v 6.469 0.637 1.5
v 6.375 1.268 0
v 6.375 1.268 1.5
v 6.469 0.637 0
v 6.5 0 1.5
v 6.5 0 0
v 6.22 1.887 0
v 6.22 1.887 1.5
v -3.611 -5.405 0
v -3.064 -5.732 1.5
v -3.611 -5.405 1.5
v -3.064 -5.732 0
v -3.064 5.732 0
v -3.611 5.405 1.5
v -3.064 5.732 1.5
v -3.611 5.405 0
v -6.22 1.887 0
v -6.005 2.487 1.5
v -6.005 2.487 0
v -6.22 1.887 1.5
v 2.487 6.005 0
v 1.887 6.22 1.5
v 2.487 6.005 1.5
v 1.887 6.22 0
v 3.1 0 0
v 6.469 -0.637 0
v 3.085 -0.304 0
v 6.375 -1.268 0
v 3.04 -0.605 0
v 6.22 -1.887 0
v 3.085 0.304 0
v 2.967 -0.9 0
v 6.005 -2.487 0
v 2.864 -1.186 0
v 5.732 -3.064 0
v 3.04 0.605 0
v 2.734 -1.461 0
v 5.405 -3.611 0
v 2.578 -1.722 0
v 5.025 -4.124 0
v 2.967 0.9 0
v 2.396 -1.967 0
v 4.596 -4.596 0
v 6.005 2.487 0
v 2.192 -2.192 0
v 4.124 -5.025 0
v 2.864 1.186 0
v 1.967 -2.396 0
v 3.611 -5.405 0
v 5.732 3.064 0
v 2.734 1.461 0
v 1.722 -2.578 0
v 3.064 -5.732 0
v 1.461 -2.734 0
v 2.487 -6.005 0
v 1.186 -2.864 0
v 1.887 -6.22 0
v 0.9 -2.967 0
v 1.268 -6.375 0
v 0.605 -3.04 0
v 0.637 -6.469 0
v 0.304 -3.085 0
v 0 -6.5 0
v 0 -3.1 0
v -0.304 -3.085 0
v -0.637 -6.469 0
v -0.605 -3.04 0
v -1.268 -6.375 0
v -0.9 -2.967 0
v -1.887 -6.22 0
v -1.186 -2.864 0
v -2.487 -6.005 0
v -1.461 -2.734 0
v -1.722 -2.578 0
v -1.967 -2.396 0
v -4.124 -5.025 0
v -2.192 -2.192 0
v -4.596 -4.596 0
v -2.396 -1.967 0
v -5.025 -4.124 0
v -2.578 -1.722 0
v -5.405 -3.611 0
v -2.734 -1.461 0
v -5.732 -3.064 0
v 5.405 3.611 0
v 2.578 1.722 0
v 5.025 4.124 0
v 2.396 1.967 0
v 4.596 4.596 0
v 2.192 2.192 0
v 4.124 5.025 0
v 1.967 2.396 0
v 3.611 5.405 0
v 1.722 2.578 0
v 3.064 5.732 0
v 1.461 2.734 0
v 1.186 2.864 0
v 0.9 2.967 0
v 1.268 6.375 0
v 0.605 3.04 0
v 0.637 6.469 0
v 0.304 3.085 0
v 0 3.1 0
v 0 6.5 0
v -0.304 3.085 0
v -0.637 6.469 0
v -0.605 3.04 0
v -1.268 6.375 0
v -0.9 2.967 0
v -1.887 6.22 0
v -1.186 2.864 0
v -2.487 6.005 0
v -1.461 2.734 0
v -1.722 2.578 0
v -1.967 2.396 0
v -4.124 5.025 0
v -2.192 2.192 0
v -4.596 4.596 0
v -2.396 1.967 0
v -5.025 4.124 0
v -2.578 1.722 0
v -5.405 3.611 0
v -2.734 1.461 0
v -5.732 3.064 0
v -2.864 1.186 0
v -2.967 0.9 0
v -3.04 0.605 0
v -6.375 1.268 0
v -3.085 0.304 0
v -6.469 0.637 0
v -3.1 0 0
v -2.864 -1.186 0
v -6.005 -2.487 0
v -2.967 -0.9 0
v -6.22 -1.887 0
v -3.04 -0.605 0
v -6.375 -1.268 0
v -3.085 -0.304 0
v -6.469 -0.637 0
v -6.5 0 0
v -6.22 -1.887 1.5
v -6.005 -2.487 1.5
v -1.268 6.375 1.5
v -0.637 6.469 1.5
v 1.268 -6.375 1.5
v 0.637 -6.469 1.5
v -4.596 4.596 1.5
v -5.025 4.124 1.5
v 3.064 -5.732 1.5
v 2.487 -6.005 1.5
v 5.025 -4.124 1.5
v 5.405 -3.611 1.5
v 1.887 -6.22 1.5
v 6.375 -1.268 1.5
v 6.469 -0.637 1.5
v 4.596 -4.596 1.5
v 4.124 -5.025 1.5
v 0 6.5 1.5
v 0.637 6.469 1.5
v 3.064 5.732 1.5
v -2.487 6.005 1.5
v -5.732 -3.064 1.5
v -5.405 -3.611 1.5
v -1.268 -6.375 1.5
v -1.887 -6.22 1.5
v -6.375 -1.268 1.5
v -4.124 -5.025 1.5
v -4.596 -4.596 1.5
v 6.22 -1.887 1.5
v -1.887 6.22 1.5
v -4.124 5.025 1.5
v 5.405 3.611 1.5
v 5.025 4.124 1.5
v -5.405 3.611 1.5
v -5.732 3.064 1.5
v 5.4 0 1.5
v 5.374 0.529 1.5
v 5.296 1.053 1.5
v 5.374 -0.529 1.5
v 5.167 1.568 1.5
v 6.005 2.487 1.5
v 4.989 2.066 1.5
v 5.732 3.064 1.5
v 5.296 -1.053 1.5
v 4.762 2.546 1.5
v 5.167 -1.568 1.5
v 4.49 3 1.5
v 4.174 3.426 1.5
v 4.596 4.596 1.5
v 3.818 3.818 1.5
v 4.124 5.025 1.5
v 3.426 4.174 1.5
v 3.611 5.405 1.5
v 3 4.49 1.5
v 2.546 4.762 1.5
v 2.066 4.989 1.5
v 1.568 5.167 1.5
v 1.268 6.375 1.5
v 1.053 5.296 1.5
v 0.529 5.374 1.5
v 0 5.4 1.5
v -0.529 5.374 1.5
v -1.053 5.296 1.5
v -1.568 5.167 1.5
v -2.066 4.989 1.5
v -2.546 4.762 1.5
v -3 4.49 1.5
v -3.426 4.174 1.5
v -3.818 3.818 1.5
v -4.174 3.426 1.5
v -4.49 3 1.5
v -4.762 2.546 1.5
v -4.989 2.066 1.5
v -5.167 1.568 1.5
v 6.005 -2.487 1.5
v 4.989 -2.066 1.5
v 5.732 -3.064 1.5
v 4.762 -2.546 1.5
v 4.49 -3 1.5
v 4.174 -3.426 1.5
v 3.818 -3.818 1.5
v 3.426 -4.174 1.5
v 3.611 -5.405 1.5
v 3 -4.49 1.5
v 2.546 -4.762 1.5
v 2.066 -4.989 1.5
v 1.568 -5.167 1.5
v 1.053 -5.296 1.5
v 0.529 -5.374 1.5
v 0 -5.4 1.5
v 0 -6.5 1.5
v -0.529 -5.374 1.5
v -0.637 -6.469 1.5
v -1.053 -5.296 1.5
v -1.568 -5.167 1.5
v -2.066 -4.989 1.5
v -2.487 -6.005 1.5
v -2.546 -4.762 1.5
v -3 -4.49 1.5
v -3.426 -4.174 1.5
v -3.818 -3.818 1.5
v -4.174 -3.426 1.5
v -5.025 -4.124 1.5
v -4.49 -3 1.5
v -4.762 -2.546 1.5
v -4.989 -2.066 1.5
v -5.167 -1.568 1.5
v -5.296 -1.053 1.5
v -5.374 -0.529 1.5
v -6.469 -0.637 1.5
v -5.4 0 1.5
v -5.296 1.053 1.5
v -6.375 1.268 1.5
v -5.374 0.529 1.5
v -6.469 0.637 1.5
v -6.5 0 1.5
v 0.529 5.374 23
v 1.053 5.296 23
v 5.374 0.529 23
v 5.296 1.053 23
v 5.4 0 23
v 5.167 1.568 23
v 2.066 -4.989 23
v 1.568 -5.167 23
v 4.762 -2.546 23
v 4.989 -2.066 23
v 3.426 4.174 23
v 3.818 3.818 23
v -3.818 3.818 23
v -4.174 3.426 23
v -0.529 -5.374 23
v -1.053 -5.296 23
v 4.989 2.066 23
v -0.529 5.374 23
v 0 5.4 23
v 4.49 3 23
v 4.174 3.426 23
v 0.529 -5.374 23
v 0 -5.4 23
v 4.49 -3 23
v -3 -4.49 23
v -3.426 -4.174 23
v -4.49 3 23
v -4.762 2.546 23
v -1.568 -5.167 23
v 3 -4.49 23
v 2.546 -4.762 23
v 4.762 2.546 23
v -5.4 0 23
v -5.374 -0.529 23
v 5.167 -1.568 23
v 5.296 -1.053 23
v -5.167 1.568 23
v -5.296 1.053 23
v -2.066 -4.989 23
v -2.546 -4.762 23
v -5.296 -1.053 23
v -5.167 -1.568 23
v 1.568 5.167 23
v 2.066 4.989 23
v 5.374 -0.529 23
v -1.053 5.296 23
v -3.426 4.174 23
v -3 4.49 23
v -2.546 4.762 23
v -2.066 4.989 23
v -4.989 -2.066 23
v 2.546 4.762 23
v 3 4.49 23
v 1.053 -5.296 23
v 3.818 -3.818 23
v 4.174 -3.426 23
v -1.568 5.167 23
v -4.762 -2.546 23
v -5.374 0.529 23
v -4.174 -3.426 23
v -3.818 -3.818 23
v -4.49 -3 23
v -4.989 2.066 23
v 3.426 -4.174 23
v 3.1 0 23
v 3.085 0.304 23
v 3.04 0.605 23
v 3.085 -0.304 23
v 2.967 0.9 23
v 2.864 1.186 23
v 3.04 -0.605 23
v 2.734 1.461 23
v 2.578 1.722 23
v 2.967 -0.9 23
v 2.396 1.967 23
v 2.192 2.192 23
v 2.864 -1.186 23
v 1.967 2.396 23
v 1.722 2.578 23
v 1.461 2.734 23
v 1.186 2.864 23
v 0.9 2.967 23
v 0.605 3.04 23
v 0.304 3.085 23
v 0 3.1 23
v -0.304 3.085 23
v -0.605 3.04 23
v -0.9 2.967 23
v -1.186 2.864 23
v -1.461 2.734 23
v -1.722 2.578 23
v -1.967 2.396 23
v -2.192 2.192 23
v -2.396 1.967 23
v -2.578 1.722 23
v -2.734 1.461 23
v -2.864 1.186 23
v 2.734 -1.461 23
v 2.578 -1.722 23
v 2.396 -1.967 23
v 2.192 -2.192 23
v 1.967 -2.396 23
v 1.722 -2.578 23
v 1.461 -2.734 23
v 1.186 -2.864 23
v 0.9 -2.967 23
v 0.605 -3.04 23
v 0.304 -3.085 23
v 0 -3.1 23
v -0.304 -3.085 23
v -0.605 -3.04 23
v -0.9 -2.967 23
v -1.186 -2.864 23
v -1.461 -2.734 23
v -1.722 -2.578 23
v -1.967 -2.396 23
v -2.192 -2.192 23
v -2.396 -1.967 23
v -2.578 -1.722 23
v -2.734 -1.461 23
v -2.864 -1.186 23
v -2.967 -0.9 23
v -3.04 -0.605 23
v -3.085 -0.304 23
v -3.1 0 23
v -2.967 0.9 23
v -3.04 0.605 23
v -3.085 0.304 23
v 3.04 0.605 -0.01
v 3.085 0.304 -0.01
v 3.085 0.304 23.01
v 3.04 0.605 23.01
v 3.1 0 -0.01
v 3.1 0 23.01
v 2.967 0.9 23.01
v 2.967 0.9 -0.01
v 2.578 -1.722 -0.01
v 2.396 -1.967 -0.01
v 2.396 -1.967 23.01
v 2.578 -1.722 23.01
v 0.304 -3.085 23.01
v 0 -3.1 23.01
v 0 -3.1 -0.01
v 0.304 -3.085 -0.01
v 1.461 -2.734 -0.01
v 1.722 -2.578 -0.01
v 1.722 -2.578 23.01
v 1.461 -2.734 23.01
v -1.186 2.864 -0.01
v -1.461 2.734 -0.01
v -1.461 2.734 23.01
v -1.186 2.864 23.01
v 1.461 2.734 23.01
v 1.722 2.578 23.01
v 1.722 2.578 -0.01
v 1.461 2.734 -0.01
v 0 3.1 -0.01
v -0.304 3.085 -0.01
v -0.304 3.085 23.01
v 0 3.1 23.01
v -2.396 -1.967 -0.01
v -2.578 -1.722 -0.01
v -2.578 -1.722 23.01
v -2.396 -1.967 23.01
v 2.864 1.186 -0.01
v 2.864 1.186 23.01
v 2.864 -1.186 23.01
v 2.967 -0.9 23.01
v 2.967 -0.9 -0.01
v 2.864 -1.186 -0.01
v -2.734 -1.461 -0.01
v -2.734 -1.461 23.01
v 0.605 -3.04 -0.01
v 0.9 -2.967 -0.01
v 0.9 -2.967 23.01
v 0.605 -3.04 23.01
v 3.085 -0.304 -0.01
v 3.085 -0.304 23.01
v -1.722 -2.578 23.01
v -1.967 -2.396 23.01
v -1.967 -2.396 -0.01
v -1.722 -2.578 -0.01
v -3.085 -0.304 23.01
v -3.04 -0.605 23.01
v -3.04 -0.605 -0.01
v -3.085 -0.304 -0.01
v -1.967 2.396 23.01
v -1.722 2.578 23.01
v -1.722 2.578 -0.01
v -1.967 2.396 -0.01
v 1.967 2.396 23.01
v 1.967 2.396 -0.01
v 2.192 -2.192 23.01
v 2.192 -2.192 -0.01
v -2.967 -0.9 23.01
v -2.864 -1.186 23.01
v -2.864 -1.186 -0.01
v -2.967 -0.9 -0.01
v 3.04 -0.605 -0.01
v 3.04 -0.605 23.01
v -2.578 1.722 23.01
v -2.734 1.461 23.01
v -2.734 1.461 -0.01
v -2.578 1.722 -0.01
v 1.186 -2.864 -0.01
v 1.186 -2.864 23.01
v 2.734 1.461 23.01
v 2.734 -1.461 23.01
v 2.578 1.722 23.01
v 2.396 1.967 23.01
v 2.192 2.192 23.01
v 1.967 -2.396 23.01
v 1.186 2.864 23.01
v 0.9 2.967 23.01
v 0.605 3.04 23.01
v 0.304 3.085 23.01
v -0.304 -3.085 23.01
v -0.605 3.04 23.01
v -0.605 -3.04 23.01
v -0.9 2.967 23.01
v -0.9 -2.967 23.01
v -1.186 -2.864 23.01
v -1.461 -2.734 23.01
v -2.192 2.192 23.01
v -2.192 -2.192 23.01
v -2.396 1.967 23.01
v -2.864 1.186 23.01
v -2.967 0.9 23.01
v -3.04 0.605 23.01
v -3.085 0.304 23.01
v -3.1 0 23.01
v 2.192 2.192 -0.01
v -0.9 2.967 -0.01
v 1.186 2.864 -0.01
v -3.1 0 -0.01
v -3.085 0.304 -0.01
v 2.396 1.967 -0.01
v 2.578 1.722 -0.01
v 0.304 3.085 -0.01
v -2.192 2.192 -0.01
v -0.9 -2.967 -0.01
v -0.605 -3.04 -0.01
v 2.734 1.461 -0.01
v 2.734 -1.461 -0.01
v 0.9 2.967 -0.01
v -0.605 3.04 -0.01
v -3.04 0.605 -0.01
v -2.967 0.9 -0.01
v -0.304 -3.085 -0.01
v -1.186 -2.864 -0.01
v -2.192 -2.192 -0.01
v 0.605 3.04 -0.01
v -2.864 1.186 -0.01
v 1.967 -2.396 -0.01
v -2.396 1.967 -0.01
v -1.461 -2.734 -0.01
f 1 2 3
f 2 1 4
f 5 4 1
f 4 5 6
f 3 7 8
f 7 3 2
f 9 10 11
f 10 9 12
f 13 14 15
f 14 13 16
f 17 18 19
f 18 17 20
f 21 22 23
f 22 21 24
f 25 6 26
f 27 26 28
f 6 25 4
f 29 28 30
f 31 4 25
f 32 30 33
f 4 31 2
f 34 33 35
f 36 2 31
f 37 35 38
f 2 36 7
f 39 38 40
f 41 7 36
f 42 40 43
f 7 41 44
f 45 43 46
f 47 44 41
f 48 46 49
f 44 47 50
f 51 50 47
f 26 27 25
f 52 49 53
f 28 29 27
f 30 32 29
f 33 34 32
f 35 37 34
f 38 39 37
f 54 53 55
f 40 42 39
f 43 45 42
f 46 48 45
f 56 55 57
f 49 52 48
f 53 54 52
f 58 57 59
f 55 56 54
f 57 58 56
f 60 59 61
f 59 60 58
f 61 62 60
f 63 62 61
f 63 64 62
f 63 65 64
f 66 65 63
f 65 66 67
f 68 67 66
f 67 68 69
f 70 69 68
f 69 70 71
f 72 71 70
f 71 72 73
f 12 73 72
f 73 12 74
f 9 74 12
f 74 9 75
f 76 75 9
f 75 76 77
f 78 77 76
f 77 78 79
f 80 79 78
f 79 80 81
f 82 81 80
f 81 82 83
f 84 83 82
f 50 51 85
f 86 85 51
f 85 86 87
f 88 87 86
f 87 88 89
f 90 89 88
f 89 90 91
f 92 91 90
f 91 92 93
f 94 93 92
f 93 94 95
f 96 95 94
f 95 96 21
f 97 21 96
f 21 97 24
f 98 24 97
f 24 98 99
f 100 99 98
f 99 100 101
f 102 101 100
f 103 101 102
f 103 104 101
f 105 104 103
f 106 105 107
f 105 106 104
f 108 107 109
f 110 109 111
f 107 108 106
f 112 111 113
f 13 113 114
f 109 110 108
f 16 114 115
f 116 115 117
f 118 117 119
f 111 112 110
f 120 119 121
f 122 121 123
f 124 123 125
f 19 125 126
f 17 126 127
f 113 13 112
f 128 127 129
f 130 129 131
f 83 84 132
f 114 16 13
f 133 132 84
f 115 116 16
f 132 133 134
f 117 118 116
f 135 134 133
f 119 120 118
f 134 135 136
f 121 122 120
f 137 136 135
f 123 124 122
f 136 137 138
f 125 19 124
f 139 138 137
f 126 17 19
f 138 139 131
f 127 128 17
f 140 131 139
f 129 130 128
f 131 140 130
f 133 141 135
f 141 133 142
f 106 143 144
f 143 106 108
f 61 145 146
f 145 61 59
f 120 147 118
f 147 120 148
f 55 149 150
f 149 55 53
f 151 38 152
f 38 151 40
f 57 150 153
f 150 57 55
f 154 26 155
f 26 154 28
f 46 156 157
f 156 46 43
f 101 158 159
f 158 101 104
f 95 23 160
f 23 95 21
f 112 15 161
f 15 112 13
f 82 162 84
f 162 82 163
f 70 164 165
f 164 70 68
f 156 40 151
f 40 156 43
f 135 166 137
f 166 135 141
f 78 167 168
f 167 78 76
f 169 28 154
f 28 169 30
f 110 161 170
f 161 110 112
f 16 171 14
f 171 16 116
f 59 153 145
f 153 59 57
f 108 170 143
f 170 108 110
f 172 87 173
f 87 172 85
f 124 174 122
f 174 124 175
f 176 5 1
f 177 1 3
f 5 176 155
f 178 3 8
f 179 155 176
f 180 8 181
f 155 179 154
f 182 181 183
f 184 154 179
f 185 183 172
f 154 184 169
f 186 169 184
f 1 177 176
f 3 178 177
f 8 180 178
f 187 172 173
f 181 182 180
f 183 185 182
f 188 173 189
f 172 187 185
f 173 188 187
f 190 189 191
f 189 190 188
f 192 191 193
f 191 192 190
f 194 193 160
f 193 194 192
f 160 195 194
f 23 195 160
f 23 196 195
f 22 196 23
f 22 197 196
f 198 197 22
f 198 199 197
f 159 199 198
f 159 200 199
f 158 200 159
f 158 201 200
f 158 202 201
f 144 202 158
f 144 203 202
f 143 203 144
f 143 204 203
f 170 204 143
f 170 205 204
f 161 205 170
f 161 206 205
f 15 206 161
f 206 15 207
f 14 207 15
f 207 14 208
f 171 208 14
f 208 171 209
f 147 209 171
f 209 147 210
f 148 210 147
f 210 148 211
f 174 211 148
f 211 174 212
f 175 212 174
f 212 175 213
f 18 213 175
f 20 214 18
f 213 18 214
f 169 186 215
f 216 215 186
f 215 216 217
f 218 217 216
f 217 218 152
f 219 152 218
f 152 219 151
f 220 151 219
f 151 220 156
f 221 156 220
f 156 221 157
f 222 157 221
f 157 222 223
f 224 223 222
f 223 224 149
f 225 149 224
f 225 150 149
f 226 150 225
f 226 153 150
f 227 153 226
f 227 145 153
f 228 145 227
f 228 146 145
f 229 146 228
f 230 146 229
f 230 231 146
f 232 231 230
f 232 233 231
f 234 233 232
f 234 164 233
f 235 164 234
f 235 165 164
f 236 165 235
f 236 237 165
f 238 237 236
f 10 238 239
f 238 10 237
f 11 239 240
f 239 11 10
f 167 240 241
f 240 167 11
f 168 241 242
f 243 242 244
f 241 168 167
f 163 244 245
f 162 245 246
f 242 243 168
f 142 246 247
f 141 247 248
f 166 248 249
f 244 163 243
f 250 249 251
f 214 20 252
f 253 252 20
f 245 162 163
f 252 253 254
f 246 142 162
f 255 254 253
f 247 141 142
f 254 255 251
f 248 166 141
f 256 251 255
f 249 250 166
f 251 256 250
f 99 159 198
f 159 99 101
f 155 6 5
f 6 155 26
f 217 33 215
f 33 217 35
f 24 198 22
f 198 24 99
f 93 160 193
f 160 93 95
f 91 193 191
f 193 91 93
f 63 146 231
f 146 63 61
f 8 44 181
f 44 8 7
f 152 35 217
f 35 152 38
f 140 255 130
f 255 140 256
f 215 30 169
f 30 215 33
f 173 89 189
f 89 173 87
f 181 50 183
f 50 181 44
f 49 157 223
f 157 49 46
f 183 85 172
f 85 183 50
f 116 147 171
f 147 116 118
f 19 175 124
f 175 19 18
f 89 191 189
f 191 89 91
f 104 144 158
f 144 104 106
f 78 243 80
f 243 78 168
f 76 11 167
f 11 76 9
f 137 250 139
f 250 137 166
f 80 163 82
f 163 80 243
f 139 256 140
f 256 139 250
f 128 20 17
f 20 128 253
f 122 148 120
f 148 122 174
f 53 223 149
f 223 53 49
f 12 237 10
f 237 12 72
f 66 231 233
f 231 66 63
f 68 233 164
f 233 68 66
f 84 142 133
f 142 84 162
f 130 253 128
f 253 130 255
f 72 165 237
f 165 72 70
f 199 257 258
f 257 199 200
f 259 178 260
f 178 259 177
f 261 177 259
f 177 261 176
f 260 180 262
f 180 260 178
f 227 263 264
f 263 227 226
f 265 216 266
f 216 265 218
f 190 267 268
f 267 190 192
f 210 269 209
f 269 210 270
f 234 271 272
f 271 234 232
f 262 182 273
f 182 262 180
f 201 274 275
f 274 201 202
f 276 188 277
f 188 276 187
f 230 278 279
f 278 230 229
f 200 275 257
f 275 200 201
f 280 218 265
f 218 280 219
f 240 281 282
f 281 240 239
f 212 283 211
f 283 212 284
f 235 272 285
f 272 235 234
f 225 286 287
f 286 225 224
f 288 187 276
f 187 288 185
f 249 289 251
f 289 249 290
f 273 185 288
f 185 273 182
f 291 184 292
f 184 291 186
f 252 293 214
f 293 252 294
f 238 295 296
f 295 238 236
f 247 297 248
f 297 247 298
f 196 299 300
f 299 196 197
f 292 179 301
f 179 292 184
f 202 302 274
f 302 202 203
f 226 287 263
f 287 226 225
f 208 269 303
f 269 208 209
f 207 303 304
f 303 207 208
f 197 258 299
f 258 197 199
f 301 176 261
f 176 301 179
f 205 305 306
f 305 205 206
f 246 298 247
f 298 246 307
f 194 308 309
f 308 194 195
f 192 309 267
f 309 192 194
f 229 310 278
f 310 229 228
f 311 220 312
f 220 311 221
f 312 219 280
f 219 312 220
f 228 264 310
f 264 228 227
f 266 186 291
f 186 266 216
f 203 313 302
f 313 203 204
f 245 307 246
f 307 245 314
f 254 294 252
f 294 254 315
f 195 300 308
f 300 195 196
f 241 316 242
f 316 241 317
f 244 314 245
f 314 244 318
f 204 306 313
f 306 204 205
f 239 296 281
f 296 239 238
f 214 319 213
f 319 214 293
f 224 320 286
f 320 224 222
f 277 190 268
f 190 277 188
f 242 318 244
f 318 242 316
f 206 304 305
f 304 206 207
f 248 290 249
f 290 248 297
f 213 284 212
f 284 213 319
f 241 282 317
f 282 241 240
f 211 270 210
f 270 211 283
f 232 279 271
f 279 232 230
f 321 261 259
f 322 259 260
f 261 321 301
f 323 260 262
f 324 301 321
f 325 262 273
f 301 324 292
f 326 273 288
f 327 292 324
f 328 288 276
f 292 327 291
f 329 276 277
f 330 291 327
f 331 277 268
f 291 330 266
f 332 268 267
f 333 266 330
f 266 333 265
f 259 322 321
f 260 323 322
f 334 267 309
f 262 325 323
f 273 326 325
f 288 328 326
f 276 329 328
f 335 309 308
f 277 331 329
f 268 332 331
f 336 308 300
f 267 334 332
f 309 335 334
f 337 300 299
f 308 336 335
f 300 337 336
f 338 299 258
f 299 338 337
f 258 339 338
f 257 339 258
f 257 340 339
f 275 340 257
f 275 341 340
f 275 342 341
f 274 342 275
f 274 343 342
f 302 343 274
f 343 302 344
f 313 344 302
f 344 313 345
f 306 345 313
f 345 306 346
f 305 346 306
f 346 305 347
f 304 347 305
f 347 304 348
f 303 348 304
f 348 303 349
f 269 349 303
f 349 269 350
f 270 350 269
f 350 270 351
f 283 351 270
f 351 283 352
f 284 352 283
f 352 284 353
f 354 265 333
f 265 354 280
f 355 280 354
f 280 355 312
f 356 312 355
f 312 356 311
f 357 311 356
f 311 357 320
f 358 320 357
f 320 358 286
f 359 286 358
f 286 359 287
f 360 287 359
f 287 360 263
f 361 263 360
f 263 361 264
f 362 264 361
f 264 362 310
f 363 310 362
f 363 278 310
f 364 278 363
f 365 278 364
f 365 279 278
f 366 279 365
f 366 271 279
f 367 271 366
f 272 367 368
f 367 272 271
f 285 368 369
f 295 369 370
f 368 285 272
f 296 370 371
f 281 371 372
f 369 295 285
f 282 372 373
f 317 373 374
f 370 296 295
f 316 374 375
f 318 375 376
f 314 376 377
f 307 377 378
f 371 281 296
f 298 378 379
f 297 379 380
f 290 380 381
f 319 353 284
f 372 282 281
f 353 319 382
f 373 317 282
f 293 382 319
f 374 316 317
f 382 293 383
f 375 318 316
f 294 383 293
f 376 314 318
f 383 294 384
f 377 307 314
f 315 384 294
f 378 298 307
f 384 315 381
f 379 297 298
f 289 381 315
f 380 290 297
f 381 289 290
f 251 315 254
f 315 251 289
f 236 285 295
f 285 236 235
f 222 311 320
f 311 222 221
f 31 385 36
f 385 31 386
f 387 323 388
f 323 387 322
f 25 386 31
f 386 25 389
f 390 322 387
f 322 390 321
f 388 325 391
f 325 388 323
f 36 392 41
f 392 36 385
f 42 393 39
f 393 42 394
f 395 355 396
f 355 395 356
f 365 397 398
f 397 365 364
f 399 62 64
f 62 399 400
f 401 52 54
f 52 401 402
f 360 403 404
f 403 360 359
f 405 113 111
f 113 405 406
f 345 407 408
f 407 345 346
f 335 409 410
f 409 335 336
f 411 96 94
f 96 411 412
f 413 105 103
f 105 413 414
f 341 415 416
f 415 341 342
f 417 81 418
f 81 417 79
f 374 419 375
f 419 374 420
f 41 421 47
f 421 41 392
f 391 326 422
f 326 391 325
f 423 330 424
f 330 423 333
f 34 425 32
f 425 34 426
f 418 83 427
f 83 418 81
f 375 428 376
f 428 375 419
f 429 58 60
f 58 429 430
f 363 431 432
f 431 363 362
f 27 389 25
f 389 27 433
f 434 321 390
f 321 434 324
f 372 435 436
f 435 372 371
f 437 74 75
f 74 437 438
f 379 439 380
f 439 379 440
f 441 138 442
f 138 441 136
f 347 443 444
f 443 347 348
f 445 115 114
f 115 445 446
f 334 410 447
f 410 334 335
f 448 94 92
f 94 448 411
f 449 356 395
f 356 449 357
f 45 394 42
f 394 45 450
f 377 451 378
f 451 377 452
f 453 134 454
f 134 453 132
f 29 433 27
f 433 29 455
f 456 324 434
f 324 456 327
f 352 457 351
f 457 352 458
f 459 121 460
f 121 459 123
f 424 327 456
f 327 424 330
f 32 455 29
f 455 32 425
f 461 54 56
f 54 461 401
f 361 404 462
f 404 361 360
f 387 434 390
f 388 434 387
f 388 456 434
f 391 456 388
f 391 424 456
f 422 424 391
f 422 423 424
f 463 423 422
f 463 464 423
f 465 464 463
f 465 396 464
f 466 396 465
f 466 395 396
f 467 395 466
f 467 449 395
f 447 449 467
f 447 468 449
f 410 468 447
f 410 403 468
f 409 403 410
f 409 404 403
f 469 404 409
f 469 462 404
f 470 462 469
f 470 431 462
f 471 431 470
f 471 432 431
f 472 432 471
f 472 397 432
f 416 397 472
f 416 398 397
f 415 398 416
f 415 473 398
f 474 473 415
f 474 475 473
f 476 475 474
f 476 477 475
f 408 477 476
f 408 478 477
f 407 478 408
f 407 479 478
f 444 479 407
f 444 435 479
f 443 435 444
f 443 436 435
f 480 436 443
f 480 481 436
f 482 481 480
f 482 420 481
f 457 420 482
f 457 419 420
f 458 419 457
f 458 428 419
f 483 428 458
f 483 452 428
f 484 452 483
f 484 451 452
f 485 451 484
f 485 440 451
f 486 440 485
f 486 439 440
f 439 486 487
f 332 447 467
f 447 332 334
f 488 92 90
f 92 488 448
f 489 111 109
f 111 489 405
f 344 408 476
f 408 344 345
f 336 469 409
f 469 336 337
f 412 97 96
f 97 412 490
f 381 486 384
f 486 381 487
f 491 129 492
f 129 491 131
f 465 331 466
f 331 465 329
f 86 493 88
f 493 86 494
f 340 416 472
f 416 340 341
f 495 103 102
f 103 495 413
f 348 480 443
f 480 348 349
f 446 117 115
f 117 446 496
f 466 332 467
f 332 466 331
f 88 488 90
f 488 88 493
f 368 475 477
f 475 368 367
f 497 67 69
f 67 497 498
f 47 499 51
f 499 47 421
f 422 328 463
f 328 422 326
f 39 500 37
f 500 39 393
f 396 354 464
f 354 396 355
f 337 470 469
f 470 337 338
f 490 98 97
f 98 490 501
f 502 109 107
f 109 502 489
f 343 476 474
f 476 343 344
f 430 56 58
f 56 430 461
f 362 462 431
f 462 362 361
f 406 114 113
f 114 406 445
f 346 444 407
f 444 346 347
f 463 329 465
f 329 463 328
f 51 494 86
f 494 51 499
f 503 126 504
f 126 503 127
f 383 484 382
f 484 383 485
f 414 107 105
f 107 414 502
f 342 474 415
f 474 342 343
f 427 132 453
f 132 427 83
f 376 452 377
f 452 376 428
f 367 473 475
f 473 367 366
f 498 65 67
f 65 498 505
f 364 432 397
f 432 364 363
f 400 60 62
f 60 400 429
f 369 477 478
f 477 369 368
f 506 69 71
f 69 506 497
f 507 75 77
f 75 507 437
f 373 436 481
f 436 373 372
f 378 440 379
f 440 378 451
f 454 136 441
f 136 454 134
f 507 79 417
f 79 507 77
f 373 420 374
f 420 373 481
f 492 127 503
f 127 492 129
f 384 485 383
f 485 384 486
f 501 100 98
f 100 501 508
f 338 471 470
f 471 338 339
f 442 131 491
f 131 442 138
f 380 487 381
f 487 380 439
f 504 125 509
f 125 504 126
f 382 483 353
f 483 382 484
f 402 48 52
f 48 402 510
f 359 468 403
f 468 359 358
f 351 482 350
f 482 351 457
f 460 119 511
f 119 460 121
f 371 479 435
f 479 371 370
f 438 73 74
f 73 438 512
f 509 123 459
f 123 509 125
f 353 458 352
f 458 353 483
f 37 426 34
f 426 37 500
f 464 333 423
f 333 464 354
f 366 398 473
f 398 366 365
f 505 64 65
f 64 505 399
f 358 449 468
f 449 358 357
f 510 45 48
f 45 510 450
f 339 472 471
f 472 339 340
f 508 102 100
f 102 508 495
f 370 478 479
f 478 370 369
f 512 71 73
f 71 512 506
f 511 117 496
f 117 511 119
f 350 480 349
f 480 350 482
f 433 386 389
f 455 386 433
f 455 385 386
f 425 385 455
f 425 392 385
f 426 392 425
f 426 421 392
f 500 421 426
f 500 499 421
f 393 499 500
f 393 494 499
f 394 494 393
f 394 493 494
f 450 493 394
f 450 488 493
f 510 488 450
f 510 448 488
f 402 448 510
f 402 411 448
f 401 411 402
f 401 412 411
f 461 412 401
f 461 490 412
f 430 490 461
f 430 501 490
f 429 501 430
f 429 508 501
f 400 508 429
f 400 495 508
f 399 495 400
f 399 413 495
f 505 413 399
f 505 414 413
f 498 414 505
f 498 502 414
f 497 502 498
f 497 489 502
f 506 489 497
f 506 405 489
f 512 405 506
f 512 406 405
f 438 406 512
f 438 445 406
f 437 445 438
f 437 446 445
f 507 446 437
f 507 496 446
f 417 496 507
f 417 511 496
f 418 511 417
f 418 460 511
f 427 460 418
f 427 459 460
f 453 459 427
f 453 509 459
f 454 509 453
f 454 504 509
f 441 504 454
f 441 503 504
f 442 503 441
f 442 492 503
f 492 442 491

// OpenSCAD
// Adapter sleeve for 0.2 mL PCR tube in 1.5 mL rack hole
// Print orientation: upside down (collar on bed, sleeve rises upward)

// Dimensions
collar_diameter = 13;        // mm, outer diameter of collar
collar_thickness = 1.5;      // mm, height of collar
sleeve_outer_diameter = 10.8; // mm, outer diameter of sleeve body
sleeve_height = 21.5;        // mm, height of sleeve body (from collar top to top of sleeve)
bore_diameter = 6.2;         // mm, inner bore diameter

// Set resolution for curves
$fn = 64;

// Collar (bottom part)
collar_height = collar_thickness;
collar_radius = collar_diameter / 2;

// Sleeve body (upper part)
sleeve_radius = sleeve_outer_diameter / 2;
sleeve_top = collar_thickness + sleeve_height;

// Bore (full height)
bore_radius = bore_diameter / 2;

// Build adapter sleeve
module adapter_sleeve() {
    // Collar base
    translate([0, 0, 0]) {
        cylinder(h = collar_thickness, r = collar_radius, center = false);
    }
    
    // Sleeve body (cylinder on top of collar)
    translate([0, 0, collar_thickness]) {
        cylinder(h = sleeve_height, r = sleeve_radius, center = false);
    }
    
    // Bore (subtract cylinder from center)
    translate([0, 0, -0.01]) {
        cylinder(h = sleeve_top + 0.02, r = bore_radius, center = false);
    }
}

// Render the adapter sleeve
adapter_sleeve();
